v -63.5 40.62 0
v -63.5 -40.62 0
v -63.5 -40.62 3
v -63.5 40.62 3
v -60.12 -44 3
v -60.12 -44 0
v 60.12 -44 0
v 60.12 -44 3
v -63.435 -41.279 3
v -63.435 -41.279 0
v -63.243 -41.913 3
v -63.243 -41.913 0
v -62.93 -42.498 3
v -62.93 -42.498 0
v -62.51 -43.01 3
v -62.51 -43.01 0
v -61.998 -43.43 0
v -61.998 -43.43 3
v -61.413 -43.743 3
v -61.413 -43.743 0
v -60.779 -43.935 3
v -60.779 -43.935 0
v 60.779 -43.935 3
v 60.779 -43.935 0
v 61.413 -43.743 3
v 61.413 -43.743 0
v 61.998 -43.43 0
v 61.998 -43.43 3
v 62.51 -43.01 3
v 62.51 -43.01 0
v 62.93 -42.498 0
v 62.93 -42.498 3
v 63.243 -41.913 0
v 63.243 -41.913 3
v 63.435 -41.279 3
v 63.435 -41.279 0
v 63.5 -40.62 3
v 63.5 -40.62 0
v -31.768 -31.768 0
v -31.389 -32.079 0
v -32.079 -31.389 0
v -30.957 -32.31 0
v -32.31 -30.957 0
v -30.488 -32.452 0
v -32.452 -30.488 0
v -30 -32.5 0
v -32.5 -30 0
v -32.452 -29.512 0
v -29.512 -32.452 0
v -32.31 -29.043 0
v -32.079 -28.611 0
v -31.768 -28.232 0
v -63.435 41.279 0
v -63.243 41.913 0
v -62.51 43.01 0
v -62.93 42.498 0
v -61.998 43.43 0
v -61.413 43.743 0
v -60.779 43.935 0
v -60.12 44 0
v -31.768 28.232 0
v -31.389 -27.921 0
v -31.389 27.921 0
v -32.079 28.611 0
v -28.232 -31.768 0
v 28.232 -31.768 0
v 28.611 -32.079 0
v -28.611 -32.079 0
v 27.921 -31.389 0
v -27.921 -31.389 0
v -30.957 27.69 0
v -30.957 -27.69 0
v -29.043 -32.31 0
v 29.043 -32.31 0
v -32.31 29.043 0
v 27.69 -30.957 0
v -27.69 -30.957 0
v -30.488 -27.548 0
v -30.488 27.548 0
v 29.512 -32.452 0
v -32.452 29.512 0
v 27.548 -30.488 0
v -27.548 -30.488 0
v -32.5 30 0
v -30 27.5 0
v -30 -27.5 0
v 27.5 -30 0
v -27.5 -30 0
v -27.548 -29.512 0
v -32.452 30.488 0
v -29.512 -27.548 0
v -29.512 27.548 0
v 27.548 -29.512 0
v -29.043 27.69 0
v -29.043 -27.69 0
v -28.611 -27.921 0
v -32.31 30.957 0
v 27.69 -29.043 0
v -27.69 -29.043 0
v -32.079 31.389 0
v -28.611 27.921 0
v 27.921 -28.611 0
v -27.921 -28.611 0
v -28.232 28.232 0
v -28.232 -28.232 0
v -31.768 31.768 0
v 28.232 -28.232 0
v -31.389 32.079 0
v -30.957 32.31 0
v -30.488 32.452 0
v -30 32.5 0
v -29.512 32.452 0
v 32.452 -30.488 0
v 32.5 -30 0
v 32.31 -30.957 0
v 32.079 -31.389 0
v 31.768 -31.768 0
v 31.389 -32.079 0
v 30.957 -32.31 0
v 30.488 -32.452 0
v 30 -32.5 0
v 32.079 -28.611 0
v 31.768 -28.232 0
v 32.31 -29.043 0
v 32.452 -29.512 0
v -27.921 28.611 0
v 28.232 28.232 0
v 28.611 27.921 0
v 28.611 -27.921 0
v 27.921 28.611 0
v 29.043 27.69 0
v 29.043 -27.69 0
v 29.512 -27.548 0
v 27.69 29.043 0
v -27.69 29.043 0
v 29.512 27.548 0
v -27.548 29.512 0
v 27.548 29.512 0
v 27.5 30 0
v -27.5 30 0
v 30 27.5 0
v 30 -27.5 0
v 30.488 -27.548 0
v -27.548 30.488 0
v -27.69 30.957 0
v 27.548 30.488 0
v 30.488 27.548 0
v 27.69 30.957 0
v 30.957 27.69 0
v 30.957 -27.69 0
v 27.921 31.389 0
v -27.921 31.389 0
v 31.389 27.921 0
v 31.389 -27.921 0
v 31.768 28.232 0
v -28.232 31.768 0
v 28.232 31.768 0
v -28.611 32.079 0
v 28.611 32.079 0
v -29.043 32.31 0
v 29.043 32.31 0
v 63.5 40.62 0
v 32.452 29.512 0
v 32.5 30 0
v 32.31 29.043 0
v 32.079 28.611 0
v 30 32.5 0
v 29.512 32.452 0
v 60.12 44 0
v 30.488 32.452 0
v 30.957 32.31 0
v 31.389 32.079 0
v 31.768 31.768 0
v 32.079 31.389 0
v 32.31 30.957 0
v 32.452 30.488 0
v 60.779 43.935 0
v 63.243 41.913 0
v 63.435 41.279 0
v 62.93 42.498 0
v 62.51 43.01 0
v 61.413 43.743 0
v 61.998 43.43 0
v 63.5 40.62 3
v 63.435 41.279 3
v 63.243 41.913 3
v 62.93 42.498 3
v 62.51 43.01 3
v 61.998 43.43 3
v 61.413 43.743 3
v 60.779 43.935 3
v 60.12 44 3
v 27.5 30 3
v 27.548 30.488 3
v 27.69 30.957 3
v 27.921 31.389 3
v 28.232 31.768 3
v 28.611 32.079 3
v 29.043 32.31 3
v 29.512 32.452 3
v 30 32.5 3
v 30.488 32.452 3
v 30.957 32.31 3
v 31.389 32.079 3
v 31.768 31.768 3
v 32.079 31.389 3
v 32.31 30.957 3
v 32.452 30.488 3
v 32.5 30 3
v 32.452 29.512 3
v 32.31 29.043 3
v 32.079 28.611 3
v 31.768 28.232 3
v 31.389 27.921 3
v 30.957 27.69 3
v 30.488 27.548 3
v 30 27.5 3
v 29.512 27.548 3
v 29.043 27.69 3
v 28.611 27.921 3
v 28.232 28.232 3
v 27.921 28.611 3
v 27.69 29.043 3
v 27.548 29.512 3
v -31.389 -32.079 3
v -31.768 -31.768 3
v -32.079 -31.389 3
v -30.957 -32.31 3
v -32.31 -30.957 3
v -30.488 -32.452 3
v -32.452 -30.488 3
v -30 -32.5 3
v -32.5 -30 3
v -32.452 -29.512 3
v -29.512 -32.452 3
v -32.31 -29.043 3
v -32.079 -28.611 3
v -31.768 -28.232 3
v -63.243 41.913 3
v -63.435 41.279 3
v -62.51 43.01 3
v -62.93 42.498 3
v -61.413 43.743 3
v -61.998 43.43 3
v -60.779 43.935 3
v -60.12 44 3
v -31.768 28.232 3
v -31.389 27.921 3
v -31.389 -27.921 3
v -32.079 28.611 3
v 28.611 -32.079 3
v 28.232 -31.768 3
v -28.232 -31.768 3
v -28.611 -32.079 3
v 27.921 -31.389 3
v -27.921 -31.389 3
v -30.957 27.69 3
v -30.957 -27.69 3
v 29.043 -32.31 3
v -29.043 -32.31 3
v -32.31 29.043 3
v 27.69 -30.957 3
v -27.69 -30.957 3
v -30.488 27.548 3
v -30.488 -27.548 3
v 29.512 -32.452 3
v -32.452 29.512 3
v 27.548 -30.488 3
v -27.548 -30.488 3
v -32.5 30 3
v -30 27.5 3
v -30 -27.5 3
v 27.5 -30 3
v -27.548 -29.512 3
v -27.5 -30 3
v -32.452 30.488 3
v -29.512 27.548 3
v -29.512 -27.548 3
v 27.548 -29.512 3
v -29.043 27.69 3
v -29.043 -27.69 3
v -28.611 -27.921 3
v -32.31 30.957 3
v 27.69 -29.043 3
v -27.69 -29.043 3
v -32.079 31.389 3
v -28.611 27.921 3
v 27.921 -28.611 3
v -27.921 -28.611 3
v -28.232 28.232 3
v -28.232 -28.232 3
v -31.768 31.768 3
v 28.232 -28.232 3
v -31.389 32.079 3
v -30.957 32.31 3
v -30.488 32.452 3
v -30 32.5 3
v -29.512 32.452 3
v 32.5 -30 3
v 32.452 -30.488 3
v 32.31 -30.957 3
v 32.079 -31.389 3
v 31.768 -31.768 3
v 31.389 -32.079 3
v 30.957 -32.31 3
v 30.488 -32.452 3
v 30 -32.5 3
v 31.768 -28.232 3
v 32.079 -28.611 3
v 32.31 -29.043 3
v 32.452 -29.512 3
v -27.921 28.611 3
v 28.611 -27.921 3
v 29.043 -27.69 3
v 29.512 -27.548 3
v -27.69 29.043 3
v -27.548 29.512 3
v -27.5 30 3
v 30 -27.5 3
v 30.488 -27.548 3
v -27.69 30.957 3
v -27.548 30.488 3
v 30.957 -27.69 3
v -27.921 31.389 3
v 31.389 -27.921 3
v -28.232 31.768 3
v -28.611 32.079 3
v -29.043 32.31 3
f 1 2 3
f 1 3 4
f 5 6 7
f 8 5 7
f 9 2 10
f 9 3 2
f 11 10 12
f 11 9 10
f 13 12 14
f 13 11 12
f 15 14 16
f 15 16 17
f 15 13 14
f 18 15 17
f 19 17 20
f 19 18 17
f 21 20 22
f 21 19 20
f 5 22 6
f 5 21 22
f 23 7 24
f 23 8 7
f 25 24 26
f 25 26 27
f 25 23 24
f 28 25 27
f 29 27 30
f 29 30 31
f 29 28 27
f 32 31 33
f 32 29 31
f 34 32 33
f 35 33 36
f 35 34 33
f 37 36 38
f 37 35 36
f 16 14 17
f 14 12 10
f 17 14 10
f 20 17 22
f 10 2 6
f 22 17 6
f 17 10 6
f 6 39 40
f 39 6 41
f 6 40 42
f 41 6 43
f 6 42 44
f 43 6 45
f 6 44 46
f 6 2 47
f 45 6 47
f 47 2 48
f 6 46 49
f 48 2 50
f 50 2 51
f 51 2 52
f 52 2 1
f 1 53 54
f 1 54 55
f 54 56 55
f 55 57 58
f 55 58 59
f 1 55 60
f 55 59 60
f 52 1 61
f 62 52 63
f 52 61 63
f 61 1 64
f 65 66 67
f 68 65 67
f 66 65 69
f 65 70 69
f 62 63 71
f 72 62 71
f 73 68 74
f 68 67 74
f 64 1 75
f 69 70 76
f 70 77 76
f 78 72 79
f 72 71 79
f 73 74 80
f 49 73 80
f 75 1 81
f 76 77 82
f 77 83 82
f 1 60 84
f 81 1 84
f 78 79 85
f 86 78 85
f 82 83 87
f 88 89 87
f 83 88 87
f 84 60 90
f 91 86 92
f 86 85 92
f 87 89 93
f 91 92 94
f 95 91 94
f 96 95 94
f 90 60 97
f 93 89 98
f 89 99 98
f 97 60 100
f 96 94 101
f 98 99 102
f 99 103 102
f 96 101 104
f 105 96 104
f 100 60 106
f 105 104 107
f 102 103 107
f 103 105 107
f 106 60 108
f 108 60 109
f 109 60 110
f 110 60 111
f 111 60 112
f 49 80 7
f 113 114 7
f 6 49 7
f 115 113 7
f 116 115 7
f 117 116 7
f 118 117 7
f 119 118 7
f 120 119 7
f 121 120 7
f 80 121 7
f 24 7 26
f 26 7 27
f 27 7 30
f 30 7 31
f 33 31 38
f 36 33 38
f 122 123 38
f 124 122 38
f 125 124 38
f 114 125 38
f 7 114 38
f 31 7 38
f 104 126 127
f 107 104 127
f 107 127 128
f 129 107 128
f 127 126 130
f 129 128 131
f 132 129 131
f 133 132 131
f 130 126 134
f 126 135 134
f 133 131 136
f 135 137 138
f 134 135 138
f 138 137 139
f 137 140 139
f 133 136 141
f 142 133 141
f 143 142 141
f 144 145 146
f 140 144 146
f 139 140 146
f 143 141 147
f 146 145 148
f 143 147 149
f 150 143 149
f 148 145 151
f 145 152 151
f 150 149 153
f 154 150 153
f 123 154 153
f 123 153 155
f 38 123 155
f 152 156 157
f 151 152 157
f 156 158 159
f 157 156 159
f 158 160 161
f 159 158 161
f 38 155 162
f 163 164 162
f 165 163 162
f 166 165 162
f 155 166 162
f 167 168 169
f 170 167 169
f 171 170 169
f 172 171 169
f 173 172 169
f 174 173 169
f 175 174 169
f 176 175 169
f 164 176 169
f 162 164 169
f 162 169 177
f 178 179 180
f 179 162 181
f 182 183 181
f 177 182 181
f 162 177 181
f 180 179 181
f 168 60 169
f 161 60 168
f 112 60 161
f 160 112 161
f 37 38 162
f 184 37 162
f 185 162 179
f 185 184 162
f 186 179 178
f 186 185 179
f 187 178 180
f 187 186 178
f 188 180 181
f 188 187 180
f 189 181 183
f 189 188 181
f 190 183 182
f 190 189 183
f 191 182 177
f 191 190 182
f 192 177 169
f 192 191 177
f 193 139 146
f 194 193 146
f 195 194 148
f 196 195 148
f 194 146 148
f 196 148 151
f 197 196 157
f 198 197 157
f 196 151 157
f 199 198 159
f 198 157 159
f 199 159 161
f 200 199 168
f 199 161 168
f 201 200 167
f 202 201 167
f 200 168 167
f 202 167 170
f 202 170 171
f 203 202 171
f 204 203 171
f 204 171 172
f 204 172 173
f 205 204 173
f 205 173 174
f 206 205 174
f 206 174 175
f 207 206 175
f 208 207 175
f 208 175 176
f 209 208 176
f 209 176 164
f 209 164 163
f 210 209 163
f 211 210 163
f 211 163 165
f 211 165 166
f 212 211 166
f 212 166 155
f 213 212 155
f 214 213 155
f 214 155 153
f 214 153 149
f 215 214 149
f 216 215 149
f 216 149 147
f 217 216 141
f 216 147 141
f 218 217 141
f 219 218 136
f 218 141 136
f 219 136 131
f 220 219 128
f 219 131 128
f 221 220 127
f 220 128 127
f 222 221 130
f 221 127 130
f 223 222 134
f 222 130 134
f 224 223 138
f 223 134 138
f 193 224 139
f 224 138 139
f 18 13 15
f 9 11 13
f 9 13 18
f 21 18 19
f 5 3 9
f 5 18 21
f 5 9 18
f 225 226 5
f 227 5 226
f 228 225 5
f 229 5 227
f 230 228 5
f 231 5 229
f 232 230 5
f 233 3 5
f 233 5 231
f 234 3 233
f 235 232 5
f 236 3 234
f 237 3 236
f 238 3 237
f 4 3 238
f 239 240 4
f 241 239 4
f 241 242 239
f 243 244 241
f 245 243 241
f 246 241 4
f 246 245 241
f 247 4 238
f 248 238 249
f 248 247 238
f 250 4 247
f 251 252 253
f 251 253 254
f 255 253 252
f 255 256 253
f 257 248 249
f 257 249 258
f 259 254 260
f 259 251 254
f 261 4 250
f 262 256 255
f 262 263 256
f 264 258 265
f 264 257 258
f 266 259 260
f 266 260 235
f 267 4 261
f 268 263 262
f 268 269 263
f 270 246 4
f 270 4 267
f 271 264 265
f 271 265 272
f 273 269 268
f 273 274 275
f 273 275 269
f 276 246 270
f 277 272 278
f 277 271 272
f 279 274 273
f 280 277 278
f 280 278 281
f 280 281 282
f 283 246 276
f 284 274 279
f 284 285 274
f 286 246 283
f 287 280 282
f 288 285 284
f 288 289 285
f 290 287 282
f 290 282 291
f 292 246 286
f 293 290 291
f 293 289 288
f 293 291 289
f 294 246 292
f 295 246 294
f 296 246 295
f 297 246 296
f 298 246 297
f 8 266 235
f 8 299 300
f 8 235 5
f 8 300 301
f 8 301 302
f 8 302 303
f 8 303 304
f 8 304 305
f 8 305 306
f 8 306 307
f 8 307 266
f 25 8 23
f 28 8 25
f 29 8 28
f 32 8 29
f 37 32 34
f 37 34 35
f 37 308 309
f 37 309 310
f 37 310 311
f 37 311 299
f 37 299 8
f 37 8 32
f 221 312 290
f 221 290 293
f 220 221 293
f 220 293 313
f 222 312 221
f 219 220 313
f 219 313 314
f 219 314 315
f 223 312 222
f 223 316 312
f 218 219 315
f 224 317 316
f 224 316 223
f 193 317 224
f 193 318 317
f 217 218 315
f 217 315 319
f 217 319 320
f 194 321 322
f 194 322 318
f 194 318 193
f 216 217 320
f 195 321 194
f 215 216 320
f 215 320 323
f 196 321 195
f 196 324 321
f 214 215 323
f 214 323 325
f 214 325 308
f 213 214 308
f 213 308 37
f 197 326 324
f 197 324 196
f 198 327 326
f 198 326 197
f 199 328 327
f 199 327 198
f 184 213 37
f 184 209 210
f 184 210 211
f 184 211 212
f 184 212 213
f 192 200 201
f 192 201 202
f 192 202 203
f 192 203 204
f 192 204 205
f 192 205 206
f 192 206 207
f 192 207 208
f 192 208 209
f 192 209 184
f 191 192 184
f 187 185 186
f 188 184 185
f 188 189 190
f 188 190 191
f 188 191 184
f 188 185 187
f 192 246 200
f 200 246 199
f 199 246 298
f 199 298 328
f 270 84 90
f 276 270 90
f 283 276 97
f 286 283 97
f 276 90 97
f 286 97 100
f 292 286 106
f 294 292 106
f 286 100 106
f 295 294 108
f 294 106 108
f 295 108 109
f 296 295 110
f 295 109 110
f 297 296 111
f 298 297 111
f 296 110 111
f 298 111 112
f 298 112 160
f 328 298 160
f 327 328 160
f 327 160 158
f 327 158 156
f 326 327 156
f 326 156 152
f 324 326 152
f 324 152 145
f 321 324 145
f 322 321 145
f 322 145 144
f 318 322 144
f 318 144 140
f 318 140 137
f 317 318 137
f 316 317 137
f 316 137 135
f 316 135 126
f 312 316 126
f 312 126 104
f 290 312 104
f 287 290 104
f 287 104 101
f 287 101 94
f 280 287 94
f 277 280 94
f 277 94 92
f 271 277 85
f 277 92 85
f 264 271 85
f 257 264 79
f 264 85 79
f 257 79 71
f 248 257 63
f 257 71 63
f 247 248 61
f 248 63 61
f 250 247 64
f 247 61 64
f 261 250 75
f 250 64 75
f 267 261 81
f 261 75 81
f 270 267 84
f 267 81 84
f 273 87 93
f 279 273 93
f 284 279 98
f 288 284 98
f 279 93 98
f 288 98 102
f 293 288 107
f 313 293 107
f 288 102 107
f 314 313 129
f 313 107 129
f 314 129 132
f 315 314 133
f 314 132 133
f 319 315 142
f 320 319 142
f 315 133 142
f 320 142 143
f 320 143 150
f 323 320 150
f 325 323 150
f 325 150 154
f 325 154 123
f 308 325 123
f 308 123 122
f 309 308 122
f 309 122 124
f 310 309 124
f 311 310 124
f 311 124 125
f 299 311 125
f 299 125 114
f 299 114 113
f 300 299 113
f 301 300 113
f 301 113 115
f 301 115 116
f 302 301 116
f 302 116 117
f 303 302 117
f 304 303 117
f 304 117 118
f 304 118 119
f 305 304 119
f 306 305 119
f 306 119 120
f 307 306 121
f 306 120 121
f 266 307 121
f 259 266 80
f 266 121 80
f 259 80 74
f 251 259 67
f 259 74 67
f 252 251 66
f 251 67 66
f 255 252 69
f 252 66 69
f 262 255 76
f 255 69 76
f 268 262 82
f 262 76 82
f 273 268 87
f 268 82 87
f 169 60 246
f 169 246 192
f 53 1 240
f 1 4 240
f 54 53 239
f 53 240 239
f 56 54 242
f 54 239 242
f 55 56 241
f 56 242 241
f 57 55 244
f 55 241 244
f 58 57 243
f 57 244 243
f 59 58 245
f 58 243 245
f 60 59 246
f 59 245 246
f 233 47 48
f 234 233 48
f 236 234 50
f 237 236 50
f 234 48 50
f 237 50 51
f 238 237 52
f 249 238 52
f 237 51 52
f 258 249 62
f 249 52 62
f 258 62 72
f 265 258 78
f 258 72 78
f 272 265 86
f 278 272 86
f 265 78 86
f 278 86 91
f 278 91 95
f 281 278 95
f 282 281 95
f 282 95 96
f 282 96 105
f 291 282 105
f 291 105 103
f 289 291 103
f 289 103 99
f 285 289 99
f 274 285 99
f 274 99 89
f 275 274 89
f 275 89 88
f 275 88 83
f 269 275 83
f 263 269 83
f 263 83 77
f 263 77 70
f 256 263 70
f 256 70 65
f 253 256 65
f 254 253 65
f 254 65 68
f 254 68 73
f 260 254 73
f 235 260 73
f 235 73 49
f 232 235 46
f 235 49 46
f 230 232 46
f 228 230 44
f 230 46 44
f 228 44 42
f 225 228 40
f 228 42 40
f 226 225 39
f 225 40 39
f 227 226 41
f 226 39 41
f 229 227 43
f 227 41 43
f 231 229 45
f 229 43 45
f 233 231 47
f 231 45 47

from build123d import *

# Parameters (mm, degrees)
SKETCH2_W           = 127
SKETCH2_H           = 88
BOSS_EXTRUDE1_DEPTH = 3
FILLET1_R           = 3.38
SKETCH3_R           = 2.5
CUT_EXTRUDE1_DEPTH  = 4


with BuildPart() as part:
    # Sketch2 → Boss-Extrude1 (new body)
    with BuildSketch(Plane.XY):
        Rectangle(SKETCH2_W, SKETCH2_H)
    extrude(amount=BOSS_EXTRUDE1_DEPTH)

    # Fillet1
    fillet1_edges = [part.edges().sort_by_distance(p)[0] for p in [
        (63.5, -44, 1.5),
        (-63.5, -44, 1.5),
        (-63.5, 44, 1.5),
        (63.5, 44, 1.5),
    ]]
    fillet(fillet1_edges, radius=FILLET1_R)

    # Sketch3 → Cut-Extrude1 (cut, through all)
    with BuildSketch(Plane(origin=(0, 0, 0), x_dir=(-1, 0, 0), z_dir=(0, 0, -1))):
        with Locations((-30, -30)):
            Circle(SKETCH3_R)
        with Locations((-30, 30)):
            Circle(SKETCH3_R)
        with Locations((30, 30)):
            Circle(SKETCH3_R)
        with Locations((30, -30)):
            Circle(SKETCH3_R)
    extrude(amount=-CUT_EXTRUDE1_DEPTH, mode=Mode.SUBTRACT)


solid = part.part
